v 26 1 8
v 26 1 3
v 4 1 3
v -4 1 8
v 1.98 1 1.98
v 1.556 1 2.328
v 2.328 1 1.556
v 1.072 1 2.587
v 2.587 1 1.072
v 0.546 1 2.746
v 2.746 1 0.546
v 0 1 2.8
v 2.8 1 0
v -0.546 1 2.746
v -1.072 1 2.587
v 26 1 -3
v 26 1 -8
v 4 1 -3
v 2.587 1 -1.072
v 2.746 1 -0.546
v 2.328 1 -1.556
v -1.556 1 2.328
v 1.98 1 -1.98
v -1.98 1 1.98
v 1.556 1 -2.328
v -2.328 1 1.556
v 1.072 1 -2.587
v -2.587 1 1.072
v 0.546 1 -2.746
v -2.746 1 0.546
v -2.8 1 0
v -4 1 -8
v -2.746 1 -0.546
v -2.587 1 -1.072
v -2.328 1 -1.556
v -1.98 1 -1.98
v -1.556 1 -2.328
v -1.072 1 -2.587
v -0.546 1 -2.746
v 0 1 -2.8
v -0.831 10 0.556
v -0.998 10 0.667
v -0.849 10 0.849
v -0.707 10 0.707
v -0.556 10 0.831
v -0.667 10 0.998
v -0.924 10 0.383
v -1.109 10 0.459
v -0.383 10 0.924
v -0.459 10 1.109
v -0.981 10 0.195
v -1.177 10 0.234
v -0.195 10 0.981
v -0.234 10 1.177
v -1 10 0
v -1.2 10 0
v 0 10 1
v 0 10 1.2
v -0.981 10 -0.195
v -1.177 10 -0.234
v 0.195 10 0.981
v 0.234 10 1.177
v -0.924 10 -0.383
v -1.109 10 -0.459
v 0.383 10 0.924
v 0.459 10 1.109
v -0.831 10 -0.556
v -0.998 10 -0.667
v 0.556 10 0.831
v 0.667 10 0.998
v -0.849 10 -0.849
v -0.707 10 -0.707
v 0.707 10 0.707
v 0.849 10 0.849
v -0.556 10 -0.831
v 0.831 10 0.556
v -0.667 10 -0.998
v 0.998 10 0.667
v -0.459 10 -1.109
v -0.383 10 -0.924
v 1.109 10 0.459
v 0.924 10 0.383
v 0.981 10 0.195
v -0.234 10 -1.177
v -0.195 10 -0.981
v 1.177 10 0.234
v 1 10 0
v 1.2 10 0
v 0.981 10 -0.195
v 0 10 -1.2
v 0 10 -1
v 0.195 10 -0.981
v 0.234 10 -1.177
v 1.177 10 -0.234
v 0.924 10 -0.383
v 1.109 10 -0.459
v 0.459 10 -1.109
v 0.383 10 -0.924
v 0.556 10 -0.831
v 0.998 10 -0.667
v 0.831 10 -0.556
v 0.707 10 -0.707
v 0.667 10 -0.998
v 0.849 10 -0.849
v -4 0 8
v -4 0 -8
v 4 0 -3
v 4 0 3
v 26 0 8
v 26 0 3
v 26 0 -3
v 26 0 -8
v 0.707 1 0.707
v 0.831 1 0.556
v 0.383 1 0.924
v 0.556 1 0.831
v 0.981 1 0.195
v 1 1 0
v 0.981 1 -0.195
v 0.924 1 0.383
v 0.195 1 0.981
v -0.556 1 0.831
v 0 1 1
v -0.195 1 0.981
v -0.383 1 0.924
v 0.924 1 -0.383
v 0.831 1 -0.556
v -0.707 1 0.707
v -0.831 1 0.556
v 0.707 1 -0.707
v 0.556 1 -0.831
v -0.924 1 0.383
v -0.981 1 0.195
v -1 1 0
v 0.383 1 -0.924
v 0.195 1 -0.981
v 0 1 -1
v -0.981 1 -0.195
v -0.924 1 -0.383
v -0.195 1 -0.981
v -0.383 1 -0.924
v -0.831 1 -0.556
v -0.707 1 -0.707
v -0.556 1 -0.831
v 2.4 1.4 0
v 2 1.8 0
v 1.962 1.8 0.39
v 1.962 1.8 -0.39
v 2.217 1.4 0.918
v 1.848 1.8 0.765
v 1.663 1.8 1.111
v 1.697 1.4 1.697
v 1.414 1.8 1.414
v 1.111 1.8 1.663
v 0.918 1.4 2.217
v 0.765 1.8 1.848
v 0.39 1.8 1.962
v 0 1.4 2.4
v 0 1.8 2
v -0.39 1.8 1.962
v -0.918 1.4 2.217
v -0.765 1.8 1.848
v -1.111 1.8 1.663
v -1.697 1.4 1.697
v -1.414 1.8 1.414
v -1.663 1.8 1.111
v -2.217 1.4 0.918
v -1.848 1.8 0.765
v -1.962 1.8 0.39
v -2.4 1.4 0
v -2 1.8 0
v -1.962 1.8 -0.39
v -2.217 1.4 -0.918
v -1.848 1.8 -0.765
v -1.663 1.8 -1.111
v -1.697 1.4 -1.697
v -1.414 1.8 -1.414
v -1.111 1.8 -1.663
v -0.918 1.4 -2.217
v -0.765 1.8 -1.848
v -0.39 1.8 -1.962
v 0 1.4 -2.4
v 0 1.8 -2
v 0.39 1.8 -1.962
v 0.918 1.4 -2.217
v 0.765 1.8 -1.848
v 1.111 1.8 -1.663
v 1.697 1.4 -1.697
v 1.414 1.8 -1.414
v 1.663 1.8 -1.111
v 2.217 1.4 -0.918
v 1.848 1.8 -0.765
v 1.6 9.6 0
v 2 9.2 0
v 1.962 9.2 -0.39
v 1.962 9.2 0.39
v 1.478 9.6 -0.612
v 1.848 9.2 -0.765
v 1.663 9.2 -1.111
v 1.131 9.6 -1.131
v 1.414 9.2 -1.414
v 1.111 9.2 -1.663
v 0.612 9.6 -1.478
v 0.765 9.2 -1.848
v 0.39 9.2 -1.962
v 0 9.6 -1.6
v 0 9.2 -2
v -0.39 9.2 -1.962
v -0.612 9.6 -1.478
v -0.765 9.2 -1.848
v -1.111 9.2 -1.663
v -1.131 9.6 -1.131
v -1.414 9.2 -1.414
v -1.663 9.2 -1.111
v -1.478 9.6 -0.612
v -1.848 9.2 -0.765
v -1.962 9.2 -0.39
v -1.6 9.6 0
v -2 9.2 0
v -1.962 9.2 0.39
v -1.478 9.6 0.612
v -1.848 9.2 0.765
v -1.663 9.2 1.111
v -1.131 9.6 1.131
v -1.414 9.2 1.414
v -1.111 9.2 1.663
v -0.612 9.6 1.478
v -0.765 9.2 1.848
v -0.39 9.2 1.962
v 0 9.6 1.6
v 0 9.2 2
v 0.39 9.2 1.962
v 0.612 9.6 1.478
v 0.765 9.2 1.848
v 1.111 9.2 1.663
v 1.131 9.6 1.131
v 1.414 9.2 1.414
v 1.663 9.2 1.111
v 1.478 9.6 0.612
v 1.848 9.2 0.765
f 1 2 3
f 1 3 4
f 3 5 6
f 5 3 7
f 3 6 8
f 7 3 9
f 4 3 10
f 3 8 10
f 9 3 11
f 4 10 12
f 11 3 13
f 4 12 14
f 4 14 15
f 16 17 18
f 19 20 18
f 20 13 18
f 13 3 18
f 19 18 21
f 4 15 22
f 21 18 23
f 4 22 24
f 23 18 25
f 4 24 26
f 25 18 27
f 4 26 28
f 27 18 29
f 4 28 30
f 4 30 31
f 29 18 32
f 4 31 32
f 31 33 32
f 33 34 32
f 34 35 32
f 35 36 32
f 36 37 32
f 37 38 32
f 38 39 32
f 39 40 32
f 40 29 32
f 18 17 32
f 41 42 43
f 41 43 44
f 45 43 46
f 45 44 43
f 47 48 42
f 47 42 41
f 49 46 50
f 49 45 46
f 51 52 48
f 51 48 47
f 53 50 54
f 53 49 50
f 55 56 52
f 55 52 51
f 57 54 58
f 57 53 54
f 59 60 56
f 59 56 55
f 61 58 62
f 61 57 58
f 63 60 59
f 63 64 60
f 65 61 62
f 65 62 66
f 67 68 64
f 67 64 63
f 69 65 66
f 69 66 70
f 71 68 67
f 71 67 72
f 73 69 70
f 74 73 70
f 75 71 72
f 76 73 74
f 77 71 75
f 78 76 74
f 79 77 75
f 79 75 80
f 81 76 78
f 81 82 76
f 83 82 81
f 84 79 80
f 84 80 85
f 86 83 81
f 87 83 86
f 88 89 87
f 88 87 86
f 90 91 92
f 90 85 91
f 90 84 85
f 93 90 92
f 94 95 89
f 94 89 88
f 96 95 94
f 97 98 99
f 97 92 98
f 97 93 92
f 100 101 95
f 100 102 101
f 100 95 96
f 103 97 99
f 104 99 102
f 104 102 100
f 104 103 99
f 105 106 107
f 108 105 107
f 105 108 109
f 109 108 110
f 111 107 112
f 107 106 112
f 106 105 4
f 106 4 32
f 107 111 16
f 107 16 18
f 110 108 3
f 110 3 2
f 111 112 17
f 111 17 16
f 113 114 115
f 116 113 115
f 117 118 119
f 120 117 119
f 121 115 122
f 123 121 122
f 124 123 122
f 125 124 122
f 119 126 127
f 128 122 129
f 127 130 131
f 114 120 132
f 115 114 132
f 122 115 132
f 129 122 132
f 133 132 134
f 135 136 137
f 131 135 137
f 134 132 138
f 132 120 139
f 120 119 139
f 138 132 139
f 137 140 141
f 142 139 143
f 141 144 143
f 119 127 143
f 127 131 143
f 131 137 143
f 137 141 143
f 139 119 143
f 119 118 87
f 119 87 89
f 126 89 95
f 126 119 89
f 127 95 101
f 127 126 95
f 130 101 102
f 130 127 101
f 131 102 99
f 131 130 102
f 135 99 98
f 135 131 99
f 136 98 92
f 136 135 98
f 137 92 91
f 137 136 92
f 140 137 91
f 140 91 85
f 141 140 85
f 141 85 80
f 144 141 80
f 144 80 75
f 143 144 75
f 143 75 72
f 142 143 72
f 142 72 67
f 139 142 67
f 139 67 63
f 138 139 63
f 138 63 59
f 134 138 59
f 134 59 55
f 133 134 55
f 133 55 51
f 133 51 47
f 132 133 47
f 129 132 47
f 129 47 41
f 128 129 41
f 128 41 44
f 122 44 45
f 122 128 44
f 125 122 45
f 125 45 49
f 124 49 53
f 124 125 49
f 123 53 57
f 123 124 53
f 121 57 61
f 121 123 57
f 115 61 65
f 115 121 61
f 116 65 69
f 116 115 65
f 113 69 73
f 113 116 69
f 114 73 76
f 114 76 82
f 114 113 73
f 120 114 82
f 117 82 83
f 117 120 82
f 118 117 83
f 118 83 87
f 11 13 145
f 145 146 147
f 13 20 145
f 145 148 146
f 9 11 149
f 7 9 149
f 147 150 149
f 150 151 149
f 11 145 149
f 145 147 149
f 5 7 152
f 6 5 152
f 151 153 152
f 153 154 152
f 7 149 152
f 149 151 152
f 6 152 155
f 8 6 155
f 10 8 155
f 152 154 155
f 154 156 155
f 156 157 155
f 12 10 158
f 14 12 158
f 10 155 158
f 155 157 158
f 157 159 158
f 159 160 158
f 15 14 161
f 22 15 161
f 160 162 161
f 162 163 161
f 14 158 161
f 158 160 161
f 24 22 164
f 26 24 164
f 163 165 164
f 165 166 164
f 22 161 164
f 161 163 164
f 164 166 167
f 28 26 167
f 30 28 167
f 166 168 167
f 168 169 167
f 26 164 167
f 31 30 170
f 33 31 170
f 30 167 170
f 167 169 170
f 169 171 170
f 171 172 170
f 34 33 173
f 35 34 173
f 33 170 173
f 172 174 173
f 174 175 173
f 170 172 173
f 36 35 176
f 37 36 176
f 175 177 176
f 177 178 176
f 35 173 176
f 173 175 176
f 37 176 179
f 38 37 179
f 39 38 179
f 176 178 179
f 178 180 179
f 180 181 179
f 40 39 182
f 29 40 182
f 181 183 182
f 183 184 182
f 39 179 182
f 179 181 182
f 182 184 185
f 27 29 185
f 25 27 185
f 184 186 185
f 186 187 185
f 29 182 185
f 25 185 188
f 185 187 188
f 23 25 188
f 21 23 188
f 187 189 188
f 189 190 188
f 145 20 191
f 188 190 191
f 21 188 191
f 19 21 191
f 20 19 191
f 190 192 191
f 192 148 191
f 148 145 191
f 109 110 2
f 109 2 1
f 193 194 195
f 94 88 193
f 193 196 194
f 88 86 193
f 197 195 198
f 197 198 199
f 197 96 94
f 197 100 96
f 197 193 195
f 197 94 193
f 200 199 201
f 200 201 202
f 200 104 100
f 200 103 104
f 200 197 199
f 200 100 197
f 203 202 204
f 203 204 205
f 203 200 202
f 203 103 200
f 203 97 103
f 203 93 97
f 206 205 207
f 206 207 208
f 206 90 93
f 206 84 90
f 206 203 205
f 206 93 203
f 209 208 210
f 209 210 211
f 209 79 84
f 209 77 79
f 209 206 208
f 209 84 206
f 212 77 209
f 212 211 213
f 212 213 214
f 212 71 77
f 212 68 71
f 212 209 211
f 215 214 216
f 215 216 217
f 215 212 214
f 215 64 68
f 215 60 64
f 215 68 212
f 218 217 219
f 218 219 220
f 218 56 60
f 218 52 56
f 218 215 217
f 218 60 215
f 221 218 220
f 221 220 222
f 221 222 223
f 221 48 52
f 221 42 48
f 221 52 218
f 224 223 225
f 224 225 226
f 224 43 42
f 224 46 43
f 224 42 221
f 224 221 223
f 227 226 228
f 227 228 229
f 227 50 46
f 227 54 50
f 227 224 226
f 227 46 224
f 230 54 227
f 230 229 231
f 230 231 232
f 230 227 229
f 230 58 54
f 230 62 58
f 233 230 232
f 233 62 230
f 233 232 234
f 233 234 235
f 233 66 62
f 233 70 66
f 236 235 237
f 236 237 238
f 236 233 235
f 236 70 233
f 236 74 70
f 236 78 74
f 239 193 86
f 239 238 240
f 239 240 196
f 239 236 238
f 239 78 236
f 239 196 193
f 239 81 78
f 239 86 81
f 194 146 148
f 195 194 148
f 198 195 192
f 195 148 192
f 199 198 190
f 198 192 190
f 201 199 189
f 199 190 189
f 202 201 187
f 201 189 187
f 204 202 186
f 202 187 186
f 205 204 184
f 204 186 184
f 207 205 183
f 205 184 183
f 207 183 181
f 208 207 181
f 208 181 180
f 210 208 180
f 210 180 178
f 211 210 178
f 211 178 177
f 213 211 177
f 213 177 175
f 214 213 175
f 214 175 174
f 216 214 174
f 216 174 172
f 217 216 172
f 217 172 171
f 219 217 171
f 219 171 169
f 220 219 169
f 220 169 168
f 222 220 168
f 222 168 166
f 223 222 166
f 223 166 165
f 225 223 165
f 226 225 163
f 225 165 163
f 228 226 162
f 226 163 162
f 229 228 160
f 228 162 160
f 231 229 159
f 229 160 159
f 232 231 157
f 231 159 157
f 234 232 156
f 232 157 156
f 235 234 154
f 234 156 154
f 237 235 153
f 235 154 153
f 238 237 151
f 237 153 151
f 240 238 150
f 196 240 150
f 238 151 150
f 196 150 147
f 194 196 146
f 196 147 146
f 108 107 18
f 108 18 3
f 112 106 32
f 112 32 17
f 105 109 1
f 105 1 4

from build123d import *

# Parameters (mm, degrees)
BOSS_EXTRUDE1_DEPTH = 1
SKETCH4_R           = 2
SKETCH4_R_2         = 1
BOSS_EXTRUDE2_DEPTH = 10
CHAMFER1_SIZE       = 0.8


with BuildPart() as part:
    # Sketch3 → Boss-Extrude1 (new body)
    with BuildSketch(Plane(origin=(0, 0, 0), x_dir=(1, 0, 0), z_dir=(0, 1, 0))):
        Polygon((26, 8), (26, 3), (4, 3), (4, -3), (26, -3), (26, -8), (-4, -8), (-4, 8), align=None)
    extrude(amount=BOSS_EXTRUDE1_DEPTH)

    # Sketch4 → Boss-Extrude2 (add)
    with BuildSketch(Plane(origin=(0, 0, 0), x_dir=(1, 0, 0), z_dir=(0, 1, 0))):
        Circle(SKETCH4_R)
        Circle(SKETCH4_R_2, mode=Mode.SUBTRACT)
    extrude(amount=BOSS_EXTRUDE2_DEPTH)

    # Chamfer1
    chamfer1_edges = [part.edges().sort_by_distance(p)[0] for p in [
        (-2, 1, 0),
        (-2, 10, 0),
    ]]
    chamfer(chamfer1_edges, length=CHAMFER1_SIZE)


solid = part.part
